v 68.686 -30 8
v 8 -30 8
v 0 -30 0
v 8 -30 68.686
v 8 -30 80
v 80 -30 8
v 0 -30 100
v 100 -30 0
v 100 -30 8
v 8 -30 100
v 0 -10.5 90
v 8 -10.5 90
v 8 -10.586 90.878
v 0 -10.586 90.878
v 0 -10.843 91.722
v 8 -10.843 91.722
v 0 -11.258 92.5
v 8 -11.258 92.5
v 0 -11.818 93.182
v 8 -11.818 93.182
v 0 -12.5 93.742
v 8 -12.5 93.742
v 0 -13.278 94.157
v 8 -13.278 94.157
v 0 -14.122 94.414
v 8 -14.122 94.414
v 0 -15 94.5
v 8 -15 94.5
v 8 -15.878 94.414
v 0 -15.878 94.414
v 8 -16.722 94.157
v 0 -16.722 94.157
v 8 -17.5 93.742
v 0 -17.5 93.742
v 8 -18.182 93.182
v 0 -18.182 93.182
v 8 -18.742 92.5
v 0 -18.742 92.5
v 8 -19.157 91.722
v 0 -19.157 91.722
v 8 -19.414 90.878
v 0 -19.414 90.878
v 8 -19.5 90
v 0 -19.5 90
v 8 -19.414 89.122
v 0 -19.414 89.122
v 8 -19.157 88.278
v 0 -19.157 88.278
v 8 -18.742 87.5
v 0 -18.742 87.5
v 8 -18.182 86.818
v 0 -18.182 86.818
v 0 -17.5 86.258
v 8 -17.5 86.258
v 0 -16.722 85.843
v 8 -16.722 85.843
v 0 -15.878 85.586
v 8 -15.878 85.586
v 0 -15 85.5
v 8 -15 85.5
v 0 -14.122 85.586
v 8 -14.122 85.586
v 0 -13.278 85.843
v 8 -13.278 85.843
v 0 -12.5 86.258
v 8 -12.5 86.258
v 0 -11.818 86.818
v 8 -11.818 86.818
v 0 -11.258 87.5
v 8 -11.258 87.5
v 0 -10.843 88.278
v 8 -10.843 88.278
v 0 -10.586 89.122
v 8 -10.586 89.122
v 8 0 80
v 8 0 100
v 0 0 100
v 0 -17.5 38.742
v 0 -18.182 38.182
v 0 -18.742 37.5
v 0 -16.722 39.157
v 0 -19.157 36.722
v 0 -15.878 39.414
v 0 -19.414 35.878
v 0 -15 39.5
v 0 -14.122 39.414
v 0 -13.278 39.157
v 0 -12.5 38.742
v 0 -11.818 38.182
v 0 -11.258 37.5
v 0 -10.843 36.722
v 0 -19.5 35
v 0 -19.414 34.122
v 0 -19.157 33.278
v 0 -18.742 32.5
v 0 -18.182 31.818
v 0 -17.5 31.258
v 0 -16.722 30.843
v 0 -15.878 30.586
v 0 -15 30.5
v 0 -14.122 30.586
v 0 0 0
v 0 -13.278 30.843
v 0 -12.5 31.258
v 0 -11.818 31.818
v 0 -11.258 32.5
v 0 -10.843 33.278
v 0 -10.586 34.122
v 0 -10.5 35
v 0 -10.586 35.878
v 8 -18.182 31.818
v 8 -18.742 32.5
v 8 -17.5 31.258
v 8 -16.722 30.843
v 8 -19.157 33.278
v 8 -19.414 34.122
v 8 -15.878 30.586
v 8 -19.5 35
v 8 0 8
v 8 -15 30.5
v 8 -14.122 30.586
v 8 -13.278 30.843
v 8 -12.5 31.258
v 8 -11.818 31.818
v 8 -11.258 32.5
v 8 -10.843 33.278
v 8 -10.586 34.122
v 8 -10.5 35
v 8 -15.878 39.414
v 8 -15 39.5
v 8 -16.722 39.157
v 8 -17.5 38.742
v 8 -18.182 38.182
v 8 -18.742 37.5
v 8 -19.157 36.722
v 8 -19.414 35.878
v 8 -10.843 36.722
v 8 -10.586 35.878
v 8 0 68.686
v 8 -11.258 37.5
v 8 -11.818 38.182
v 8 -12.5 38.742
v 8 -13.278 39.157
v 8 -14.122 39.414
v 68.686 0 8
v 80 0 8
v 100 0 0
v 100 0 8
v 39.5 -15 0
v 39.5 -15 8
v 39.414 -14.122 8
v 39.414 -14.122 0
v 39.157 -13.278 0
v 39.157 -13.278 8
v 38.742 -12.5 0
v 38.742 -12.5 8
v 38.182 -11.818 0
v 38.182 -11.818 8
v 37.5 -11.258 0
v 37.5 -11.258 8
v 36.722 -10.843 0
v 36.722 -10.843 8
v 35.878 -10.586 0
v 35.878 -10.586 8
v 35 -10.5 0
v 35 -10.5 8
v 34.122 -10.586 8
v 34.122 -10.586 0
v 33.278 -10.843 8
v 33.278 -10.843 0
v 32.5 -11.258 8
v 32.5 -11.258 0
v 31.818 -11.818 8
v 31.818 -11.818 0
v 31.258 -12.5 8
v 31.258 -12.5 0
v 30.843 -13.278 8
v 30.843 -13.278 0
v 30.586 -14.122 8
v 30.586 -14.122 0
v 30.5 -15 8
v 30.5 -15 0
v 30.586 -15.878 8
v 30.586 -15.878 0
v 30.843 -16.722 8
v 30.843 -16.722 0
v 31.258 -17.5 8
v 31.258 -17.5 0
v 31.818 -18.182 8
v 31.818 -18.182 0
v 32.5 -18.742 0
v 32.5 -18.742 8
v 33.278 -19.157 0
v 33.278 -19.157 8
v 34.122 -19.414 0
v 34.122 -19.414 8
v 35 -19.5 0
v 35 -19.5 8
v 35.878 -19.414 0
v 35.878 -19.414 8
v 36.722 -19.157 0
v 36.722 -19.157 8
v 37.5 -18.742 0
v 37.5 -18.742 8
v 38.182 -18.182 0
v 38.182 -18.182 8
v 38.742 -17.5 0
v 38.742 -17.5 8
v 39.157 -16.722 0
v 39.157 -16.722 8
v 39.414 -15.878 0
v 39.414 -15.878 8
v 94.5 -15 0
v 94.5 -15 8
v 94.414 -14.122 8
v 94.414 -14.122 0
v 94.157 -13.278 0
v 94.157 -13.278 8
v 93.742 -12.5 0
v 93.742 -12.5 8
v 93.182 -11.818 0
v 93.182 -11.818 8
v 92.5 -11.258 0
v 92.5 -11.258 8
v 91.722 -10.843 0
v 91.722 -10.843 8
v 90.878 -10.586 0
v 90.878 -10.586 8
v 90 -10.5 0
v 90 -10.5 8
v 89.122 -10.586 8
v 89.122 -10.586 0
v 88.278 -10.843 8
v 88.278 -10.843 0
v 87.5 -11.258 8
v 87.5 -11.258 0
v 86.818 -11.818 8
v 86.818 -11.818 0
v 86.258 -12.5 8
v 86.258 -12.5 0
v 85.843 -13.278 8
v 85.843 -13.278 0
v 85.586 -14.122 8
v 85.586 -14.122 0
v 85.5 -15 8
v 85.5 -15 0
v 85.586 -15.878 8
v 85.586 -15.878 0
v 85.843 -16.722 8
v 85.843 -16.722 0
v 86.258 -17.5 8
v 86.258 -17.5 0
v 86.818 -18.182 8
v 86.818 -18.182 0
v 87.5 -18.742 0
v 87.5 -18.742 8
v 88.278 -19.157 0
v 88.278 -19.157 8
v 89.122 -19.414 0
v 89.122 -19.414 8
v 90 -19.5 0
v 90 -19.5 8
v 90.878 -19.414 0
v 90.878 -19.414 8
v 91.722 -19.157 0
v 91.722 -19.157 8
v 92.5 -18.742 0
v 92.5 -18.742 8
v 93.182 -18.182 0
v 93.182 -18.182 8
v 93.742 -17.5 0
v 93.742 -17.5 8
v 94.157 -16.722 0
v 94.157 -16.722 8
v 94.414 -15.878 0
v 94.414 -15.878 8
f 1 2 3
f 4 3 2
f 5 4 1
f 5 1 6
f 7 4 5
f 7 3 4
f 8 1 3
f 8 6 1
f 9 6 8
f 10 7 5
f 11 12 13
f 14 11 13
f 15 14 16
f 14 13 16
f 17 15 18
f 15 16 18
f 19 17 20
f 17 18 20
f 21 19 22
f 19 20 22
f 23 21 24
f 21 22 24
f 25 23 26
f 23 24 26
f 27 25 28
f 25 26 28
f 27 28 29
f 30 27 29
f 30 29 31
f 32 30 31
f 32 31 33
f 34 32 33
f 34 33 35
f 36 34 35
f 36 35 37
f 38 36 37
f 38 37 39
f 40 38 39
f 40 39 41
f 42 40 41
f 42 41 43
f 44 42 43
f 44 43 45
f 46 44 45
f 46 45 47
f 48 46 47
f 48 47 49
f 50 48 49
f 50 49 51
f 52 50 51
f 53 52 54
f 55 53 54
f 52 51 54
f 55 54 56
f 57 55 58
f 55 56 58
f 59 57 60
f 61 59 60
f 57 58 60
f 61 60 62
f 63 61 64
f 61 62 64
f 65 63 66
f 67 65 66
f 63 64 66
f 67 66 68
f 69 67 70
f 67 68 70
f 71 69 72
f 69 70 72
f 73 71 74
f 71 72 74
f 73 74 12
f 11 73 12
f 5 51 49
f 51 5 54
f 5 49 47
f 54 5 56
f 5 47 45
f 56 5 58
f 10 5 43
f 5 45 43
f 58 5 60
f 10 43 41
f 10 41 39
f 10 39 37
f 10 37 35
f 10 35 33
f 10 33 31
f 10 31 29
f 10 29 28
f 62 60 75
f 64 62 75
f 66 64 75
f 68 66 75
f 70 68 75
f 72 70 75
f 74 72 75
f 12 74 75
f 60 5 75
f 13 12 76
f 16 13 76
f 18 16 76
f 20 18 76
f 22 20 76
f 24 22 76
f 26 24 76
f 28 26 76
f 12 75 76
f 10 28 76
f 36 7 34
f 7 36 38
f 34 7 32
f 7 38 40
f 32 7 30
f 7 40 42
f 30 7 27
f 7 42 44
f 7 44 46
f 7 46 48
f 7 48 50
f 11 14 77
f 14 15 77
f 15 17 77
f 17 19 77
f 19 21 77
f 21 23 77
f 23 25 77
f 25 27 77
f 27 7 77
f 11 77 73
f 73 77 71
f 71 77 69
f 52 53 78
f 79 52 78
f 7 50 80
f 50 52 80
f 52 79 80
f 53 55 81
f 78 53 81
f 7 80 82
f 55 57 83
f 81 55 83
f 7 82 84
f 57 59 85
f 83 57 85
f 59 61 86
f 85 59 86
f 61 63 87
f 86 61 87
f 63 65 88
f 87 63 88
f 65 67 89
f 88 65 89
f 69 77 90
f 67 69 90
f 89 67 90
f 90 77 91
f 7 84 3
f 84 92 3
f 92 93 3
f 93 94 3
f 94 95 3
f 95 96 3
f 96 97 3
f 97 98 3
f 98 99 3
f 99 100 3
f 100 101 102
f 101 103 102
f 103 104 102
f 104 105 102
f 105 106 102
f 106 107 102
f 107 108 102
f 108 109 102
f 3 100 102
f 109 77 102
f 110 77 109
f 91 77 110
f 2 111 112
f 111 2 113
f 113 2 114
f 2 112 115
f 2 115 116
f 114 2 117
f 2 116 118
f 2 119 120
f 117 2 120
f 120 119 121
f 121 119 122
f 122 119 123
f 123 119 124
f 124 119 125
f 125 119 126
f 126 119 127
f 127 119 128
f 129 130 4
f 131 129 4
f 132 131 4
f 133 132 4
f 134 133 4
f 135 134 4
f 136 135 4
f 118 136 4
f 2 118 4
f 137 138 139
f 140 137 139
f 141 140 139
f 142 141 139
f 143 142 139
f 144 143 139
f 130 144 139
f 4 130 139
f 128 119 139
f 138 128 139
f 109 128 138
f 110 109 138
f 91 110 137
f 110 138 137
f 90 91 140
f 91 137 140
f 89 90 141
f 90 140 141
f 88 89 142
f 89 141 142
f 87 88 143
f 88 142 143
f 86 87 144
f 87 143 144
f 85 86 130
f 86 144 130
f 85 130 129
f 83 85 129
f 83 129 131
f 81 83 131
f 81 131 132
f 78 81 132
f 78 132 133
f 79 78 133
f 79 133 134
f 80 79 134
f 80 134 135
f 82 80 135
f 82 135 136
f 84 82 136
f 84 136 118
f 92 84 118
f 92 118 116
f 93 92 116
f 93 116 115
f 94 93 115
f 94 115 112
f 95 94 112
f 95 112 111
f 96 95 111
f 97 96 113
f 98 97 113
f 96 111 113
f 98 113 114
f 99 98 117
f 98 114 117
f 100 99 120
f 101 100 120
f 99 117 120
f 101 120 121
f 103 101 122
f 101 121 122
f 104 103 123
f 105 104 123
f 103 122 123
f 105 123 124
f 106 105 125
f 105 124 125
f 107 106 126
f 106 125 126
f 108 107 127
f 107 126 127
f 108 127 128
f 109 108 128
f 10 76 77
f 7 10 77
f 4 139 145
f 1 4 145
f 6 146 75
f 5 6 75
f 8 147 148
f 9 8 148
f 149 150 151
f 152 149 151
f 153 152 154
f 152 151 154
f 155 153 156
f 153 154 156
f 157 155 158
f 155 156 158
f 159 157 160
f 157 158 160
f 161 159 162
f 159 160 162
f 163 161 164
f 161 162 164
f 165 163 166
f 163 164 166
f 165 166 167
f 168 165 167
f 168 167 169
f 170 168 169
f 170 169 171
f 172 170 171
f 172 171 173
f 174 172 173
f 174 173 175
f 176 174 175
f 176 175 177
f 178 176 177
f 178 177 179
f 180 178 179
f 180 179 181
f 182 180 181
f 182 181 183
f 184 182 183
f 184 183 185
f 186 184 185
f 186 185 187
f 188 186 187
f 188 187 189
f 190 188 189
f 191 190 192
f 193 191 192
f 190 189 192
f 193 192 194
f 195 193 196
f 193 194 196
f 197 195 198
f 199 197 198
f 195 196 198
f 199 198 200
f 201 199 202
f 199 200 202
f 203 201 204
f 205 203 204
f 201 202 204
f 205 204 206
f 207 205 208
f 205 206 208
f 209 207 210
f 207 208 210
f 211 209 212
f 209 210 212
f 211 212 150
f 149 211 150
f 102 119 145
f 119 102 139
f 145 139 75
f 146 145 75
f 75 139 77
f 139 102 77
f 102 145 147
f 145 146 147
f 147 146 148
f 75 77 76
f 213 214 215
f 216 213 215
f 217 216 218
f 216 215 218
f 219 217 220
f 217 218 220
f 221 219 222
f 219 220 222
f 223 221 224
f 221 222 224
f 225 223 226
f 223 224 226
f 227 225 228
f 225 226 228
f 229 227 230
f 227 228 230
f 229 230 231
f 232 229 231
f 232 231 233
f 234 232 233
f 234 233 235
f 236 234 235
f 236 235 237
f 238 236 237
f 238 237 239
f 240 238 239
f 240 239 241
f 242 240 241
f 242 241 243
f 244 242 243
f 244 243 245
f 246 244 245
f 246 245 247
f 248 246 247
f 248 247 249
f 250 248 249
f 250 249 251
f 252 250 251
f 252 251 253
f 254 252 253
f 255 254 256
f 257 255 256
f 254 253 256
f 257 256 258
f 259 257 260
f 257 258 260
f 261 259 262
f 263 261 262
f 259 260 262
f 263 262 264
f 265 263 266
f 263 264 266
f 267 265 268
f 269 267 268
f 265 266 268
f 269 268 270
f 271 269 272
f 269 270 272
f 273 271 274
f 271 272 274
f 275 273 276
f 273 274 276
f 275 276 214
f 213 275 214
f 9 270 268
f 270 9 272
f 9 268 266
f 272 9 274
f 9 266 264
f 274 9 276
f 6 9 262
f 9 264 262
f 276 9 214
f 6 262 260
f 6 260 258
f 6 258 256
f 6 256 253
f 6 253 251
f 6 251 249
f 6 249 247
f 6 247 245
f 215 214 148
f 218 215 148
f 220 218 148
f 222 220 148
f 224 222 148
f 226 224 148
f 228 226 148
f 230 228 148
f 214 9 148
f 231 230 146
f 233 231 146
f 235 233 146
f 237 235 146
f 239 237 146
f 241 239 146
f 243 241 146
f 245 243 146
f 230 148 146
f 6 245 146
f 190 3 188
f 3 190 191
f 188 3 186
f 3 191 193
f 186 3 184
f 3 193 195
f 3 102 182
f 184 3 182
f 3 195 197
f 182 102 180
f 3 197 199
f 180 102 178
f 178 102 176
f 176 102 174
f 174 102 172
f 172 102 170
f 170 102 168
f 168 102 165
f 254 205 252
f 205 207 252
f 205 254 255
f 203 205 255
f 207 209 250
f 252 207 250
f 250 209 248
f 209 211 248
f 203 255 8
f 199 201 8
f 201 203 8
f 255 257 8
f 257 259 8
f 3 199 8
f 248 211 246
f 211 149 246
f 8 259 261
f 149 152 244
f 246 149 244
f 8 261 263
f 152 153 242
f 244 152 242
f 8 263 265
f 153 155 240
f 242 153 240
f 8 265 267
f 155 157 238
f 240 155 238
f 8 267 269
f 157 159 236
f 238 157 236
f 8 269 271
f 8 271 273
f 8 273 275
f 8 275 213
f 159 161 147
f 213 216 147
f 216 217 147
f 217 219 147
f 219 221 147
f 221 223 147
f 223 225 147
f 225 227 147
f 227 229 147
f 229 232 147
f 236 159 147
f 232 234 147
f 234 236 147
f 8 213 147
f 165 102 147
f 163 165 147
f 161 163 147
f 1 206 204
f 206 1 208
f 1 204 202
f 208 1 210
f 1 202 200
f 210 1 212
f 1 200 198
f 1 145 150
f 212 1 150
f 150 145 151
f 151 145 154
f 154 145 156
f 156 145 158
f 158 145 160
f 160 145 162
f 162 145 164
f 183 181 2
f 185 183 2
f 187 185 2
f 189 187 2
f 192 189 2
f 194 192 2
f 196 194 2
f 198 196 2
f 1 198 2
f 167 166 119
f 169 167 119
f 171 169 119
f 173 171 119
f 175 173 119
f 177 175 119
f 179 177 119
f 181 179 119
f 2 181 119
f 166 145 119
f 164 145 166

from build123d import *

# Parameters (mm, degrees)
F1_DEPTH = 30
F3_D     = 9
F3_DEPTH = 8.001
F5_D     = 9
F5_DEPTH = 8.001


with BuildPart() as f1:
    # F0 (on Front) → F1 (new body)
    with BuildSketch(Plane.XZ):
        Polygon((0, 100), (0, 0), (100, 0), (100, 8), (80, 8), (8, 80), (8, 100), align=None)
        Polygon((8, 8), (8, 68.686291501), (68.686291501, 8), align=None, mode=Mode.SUBTRACT)
    extrude(amount=F1_DEPTH)

    # F3 (through all, one way)
    with BuildSketch(Plane.XY.offset(8)):
        with Locations((35, -15), (90, -15)):
            Circle(F3_D / 2)
    extrude(amount=-F3_DEPTH, mode=Mode.SUBTRACT)

    # F5 (through all, one way)
    with BuildSketch(Plane.YZ.offset(8)):
        with Locations((-15, 90), (-15, 35)):
            Circle(F5_D / 2)
    extrude(amount=-F5_DEPTH, mode=Mode.SUBTRACT)


solid = f1.part
